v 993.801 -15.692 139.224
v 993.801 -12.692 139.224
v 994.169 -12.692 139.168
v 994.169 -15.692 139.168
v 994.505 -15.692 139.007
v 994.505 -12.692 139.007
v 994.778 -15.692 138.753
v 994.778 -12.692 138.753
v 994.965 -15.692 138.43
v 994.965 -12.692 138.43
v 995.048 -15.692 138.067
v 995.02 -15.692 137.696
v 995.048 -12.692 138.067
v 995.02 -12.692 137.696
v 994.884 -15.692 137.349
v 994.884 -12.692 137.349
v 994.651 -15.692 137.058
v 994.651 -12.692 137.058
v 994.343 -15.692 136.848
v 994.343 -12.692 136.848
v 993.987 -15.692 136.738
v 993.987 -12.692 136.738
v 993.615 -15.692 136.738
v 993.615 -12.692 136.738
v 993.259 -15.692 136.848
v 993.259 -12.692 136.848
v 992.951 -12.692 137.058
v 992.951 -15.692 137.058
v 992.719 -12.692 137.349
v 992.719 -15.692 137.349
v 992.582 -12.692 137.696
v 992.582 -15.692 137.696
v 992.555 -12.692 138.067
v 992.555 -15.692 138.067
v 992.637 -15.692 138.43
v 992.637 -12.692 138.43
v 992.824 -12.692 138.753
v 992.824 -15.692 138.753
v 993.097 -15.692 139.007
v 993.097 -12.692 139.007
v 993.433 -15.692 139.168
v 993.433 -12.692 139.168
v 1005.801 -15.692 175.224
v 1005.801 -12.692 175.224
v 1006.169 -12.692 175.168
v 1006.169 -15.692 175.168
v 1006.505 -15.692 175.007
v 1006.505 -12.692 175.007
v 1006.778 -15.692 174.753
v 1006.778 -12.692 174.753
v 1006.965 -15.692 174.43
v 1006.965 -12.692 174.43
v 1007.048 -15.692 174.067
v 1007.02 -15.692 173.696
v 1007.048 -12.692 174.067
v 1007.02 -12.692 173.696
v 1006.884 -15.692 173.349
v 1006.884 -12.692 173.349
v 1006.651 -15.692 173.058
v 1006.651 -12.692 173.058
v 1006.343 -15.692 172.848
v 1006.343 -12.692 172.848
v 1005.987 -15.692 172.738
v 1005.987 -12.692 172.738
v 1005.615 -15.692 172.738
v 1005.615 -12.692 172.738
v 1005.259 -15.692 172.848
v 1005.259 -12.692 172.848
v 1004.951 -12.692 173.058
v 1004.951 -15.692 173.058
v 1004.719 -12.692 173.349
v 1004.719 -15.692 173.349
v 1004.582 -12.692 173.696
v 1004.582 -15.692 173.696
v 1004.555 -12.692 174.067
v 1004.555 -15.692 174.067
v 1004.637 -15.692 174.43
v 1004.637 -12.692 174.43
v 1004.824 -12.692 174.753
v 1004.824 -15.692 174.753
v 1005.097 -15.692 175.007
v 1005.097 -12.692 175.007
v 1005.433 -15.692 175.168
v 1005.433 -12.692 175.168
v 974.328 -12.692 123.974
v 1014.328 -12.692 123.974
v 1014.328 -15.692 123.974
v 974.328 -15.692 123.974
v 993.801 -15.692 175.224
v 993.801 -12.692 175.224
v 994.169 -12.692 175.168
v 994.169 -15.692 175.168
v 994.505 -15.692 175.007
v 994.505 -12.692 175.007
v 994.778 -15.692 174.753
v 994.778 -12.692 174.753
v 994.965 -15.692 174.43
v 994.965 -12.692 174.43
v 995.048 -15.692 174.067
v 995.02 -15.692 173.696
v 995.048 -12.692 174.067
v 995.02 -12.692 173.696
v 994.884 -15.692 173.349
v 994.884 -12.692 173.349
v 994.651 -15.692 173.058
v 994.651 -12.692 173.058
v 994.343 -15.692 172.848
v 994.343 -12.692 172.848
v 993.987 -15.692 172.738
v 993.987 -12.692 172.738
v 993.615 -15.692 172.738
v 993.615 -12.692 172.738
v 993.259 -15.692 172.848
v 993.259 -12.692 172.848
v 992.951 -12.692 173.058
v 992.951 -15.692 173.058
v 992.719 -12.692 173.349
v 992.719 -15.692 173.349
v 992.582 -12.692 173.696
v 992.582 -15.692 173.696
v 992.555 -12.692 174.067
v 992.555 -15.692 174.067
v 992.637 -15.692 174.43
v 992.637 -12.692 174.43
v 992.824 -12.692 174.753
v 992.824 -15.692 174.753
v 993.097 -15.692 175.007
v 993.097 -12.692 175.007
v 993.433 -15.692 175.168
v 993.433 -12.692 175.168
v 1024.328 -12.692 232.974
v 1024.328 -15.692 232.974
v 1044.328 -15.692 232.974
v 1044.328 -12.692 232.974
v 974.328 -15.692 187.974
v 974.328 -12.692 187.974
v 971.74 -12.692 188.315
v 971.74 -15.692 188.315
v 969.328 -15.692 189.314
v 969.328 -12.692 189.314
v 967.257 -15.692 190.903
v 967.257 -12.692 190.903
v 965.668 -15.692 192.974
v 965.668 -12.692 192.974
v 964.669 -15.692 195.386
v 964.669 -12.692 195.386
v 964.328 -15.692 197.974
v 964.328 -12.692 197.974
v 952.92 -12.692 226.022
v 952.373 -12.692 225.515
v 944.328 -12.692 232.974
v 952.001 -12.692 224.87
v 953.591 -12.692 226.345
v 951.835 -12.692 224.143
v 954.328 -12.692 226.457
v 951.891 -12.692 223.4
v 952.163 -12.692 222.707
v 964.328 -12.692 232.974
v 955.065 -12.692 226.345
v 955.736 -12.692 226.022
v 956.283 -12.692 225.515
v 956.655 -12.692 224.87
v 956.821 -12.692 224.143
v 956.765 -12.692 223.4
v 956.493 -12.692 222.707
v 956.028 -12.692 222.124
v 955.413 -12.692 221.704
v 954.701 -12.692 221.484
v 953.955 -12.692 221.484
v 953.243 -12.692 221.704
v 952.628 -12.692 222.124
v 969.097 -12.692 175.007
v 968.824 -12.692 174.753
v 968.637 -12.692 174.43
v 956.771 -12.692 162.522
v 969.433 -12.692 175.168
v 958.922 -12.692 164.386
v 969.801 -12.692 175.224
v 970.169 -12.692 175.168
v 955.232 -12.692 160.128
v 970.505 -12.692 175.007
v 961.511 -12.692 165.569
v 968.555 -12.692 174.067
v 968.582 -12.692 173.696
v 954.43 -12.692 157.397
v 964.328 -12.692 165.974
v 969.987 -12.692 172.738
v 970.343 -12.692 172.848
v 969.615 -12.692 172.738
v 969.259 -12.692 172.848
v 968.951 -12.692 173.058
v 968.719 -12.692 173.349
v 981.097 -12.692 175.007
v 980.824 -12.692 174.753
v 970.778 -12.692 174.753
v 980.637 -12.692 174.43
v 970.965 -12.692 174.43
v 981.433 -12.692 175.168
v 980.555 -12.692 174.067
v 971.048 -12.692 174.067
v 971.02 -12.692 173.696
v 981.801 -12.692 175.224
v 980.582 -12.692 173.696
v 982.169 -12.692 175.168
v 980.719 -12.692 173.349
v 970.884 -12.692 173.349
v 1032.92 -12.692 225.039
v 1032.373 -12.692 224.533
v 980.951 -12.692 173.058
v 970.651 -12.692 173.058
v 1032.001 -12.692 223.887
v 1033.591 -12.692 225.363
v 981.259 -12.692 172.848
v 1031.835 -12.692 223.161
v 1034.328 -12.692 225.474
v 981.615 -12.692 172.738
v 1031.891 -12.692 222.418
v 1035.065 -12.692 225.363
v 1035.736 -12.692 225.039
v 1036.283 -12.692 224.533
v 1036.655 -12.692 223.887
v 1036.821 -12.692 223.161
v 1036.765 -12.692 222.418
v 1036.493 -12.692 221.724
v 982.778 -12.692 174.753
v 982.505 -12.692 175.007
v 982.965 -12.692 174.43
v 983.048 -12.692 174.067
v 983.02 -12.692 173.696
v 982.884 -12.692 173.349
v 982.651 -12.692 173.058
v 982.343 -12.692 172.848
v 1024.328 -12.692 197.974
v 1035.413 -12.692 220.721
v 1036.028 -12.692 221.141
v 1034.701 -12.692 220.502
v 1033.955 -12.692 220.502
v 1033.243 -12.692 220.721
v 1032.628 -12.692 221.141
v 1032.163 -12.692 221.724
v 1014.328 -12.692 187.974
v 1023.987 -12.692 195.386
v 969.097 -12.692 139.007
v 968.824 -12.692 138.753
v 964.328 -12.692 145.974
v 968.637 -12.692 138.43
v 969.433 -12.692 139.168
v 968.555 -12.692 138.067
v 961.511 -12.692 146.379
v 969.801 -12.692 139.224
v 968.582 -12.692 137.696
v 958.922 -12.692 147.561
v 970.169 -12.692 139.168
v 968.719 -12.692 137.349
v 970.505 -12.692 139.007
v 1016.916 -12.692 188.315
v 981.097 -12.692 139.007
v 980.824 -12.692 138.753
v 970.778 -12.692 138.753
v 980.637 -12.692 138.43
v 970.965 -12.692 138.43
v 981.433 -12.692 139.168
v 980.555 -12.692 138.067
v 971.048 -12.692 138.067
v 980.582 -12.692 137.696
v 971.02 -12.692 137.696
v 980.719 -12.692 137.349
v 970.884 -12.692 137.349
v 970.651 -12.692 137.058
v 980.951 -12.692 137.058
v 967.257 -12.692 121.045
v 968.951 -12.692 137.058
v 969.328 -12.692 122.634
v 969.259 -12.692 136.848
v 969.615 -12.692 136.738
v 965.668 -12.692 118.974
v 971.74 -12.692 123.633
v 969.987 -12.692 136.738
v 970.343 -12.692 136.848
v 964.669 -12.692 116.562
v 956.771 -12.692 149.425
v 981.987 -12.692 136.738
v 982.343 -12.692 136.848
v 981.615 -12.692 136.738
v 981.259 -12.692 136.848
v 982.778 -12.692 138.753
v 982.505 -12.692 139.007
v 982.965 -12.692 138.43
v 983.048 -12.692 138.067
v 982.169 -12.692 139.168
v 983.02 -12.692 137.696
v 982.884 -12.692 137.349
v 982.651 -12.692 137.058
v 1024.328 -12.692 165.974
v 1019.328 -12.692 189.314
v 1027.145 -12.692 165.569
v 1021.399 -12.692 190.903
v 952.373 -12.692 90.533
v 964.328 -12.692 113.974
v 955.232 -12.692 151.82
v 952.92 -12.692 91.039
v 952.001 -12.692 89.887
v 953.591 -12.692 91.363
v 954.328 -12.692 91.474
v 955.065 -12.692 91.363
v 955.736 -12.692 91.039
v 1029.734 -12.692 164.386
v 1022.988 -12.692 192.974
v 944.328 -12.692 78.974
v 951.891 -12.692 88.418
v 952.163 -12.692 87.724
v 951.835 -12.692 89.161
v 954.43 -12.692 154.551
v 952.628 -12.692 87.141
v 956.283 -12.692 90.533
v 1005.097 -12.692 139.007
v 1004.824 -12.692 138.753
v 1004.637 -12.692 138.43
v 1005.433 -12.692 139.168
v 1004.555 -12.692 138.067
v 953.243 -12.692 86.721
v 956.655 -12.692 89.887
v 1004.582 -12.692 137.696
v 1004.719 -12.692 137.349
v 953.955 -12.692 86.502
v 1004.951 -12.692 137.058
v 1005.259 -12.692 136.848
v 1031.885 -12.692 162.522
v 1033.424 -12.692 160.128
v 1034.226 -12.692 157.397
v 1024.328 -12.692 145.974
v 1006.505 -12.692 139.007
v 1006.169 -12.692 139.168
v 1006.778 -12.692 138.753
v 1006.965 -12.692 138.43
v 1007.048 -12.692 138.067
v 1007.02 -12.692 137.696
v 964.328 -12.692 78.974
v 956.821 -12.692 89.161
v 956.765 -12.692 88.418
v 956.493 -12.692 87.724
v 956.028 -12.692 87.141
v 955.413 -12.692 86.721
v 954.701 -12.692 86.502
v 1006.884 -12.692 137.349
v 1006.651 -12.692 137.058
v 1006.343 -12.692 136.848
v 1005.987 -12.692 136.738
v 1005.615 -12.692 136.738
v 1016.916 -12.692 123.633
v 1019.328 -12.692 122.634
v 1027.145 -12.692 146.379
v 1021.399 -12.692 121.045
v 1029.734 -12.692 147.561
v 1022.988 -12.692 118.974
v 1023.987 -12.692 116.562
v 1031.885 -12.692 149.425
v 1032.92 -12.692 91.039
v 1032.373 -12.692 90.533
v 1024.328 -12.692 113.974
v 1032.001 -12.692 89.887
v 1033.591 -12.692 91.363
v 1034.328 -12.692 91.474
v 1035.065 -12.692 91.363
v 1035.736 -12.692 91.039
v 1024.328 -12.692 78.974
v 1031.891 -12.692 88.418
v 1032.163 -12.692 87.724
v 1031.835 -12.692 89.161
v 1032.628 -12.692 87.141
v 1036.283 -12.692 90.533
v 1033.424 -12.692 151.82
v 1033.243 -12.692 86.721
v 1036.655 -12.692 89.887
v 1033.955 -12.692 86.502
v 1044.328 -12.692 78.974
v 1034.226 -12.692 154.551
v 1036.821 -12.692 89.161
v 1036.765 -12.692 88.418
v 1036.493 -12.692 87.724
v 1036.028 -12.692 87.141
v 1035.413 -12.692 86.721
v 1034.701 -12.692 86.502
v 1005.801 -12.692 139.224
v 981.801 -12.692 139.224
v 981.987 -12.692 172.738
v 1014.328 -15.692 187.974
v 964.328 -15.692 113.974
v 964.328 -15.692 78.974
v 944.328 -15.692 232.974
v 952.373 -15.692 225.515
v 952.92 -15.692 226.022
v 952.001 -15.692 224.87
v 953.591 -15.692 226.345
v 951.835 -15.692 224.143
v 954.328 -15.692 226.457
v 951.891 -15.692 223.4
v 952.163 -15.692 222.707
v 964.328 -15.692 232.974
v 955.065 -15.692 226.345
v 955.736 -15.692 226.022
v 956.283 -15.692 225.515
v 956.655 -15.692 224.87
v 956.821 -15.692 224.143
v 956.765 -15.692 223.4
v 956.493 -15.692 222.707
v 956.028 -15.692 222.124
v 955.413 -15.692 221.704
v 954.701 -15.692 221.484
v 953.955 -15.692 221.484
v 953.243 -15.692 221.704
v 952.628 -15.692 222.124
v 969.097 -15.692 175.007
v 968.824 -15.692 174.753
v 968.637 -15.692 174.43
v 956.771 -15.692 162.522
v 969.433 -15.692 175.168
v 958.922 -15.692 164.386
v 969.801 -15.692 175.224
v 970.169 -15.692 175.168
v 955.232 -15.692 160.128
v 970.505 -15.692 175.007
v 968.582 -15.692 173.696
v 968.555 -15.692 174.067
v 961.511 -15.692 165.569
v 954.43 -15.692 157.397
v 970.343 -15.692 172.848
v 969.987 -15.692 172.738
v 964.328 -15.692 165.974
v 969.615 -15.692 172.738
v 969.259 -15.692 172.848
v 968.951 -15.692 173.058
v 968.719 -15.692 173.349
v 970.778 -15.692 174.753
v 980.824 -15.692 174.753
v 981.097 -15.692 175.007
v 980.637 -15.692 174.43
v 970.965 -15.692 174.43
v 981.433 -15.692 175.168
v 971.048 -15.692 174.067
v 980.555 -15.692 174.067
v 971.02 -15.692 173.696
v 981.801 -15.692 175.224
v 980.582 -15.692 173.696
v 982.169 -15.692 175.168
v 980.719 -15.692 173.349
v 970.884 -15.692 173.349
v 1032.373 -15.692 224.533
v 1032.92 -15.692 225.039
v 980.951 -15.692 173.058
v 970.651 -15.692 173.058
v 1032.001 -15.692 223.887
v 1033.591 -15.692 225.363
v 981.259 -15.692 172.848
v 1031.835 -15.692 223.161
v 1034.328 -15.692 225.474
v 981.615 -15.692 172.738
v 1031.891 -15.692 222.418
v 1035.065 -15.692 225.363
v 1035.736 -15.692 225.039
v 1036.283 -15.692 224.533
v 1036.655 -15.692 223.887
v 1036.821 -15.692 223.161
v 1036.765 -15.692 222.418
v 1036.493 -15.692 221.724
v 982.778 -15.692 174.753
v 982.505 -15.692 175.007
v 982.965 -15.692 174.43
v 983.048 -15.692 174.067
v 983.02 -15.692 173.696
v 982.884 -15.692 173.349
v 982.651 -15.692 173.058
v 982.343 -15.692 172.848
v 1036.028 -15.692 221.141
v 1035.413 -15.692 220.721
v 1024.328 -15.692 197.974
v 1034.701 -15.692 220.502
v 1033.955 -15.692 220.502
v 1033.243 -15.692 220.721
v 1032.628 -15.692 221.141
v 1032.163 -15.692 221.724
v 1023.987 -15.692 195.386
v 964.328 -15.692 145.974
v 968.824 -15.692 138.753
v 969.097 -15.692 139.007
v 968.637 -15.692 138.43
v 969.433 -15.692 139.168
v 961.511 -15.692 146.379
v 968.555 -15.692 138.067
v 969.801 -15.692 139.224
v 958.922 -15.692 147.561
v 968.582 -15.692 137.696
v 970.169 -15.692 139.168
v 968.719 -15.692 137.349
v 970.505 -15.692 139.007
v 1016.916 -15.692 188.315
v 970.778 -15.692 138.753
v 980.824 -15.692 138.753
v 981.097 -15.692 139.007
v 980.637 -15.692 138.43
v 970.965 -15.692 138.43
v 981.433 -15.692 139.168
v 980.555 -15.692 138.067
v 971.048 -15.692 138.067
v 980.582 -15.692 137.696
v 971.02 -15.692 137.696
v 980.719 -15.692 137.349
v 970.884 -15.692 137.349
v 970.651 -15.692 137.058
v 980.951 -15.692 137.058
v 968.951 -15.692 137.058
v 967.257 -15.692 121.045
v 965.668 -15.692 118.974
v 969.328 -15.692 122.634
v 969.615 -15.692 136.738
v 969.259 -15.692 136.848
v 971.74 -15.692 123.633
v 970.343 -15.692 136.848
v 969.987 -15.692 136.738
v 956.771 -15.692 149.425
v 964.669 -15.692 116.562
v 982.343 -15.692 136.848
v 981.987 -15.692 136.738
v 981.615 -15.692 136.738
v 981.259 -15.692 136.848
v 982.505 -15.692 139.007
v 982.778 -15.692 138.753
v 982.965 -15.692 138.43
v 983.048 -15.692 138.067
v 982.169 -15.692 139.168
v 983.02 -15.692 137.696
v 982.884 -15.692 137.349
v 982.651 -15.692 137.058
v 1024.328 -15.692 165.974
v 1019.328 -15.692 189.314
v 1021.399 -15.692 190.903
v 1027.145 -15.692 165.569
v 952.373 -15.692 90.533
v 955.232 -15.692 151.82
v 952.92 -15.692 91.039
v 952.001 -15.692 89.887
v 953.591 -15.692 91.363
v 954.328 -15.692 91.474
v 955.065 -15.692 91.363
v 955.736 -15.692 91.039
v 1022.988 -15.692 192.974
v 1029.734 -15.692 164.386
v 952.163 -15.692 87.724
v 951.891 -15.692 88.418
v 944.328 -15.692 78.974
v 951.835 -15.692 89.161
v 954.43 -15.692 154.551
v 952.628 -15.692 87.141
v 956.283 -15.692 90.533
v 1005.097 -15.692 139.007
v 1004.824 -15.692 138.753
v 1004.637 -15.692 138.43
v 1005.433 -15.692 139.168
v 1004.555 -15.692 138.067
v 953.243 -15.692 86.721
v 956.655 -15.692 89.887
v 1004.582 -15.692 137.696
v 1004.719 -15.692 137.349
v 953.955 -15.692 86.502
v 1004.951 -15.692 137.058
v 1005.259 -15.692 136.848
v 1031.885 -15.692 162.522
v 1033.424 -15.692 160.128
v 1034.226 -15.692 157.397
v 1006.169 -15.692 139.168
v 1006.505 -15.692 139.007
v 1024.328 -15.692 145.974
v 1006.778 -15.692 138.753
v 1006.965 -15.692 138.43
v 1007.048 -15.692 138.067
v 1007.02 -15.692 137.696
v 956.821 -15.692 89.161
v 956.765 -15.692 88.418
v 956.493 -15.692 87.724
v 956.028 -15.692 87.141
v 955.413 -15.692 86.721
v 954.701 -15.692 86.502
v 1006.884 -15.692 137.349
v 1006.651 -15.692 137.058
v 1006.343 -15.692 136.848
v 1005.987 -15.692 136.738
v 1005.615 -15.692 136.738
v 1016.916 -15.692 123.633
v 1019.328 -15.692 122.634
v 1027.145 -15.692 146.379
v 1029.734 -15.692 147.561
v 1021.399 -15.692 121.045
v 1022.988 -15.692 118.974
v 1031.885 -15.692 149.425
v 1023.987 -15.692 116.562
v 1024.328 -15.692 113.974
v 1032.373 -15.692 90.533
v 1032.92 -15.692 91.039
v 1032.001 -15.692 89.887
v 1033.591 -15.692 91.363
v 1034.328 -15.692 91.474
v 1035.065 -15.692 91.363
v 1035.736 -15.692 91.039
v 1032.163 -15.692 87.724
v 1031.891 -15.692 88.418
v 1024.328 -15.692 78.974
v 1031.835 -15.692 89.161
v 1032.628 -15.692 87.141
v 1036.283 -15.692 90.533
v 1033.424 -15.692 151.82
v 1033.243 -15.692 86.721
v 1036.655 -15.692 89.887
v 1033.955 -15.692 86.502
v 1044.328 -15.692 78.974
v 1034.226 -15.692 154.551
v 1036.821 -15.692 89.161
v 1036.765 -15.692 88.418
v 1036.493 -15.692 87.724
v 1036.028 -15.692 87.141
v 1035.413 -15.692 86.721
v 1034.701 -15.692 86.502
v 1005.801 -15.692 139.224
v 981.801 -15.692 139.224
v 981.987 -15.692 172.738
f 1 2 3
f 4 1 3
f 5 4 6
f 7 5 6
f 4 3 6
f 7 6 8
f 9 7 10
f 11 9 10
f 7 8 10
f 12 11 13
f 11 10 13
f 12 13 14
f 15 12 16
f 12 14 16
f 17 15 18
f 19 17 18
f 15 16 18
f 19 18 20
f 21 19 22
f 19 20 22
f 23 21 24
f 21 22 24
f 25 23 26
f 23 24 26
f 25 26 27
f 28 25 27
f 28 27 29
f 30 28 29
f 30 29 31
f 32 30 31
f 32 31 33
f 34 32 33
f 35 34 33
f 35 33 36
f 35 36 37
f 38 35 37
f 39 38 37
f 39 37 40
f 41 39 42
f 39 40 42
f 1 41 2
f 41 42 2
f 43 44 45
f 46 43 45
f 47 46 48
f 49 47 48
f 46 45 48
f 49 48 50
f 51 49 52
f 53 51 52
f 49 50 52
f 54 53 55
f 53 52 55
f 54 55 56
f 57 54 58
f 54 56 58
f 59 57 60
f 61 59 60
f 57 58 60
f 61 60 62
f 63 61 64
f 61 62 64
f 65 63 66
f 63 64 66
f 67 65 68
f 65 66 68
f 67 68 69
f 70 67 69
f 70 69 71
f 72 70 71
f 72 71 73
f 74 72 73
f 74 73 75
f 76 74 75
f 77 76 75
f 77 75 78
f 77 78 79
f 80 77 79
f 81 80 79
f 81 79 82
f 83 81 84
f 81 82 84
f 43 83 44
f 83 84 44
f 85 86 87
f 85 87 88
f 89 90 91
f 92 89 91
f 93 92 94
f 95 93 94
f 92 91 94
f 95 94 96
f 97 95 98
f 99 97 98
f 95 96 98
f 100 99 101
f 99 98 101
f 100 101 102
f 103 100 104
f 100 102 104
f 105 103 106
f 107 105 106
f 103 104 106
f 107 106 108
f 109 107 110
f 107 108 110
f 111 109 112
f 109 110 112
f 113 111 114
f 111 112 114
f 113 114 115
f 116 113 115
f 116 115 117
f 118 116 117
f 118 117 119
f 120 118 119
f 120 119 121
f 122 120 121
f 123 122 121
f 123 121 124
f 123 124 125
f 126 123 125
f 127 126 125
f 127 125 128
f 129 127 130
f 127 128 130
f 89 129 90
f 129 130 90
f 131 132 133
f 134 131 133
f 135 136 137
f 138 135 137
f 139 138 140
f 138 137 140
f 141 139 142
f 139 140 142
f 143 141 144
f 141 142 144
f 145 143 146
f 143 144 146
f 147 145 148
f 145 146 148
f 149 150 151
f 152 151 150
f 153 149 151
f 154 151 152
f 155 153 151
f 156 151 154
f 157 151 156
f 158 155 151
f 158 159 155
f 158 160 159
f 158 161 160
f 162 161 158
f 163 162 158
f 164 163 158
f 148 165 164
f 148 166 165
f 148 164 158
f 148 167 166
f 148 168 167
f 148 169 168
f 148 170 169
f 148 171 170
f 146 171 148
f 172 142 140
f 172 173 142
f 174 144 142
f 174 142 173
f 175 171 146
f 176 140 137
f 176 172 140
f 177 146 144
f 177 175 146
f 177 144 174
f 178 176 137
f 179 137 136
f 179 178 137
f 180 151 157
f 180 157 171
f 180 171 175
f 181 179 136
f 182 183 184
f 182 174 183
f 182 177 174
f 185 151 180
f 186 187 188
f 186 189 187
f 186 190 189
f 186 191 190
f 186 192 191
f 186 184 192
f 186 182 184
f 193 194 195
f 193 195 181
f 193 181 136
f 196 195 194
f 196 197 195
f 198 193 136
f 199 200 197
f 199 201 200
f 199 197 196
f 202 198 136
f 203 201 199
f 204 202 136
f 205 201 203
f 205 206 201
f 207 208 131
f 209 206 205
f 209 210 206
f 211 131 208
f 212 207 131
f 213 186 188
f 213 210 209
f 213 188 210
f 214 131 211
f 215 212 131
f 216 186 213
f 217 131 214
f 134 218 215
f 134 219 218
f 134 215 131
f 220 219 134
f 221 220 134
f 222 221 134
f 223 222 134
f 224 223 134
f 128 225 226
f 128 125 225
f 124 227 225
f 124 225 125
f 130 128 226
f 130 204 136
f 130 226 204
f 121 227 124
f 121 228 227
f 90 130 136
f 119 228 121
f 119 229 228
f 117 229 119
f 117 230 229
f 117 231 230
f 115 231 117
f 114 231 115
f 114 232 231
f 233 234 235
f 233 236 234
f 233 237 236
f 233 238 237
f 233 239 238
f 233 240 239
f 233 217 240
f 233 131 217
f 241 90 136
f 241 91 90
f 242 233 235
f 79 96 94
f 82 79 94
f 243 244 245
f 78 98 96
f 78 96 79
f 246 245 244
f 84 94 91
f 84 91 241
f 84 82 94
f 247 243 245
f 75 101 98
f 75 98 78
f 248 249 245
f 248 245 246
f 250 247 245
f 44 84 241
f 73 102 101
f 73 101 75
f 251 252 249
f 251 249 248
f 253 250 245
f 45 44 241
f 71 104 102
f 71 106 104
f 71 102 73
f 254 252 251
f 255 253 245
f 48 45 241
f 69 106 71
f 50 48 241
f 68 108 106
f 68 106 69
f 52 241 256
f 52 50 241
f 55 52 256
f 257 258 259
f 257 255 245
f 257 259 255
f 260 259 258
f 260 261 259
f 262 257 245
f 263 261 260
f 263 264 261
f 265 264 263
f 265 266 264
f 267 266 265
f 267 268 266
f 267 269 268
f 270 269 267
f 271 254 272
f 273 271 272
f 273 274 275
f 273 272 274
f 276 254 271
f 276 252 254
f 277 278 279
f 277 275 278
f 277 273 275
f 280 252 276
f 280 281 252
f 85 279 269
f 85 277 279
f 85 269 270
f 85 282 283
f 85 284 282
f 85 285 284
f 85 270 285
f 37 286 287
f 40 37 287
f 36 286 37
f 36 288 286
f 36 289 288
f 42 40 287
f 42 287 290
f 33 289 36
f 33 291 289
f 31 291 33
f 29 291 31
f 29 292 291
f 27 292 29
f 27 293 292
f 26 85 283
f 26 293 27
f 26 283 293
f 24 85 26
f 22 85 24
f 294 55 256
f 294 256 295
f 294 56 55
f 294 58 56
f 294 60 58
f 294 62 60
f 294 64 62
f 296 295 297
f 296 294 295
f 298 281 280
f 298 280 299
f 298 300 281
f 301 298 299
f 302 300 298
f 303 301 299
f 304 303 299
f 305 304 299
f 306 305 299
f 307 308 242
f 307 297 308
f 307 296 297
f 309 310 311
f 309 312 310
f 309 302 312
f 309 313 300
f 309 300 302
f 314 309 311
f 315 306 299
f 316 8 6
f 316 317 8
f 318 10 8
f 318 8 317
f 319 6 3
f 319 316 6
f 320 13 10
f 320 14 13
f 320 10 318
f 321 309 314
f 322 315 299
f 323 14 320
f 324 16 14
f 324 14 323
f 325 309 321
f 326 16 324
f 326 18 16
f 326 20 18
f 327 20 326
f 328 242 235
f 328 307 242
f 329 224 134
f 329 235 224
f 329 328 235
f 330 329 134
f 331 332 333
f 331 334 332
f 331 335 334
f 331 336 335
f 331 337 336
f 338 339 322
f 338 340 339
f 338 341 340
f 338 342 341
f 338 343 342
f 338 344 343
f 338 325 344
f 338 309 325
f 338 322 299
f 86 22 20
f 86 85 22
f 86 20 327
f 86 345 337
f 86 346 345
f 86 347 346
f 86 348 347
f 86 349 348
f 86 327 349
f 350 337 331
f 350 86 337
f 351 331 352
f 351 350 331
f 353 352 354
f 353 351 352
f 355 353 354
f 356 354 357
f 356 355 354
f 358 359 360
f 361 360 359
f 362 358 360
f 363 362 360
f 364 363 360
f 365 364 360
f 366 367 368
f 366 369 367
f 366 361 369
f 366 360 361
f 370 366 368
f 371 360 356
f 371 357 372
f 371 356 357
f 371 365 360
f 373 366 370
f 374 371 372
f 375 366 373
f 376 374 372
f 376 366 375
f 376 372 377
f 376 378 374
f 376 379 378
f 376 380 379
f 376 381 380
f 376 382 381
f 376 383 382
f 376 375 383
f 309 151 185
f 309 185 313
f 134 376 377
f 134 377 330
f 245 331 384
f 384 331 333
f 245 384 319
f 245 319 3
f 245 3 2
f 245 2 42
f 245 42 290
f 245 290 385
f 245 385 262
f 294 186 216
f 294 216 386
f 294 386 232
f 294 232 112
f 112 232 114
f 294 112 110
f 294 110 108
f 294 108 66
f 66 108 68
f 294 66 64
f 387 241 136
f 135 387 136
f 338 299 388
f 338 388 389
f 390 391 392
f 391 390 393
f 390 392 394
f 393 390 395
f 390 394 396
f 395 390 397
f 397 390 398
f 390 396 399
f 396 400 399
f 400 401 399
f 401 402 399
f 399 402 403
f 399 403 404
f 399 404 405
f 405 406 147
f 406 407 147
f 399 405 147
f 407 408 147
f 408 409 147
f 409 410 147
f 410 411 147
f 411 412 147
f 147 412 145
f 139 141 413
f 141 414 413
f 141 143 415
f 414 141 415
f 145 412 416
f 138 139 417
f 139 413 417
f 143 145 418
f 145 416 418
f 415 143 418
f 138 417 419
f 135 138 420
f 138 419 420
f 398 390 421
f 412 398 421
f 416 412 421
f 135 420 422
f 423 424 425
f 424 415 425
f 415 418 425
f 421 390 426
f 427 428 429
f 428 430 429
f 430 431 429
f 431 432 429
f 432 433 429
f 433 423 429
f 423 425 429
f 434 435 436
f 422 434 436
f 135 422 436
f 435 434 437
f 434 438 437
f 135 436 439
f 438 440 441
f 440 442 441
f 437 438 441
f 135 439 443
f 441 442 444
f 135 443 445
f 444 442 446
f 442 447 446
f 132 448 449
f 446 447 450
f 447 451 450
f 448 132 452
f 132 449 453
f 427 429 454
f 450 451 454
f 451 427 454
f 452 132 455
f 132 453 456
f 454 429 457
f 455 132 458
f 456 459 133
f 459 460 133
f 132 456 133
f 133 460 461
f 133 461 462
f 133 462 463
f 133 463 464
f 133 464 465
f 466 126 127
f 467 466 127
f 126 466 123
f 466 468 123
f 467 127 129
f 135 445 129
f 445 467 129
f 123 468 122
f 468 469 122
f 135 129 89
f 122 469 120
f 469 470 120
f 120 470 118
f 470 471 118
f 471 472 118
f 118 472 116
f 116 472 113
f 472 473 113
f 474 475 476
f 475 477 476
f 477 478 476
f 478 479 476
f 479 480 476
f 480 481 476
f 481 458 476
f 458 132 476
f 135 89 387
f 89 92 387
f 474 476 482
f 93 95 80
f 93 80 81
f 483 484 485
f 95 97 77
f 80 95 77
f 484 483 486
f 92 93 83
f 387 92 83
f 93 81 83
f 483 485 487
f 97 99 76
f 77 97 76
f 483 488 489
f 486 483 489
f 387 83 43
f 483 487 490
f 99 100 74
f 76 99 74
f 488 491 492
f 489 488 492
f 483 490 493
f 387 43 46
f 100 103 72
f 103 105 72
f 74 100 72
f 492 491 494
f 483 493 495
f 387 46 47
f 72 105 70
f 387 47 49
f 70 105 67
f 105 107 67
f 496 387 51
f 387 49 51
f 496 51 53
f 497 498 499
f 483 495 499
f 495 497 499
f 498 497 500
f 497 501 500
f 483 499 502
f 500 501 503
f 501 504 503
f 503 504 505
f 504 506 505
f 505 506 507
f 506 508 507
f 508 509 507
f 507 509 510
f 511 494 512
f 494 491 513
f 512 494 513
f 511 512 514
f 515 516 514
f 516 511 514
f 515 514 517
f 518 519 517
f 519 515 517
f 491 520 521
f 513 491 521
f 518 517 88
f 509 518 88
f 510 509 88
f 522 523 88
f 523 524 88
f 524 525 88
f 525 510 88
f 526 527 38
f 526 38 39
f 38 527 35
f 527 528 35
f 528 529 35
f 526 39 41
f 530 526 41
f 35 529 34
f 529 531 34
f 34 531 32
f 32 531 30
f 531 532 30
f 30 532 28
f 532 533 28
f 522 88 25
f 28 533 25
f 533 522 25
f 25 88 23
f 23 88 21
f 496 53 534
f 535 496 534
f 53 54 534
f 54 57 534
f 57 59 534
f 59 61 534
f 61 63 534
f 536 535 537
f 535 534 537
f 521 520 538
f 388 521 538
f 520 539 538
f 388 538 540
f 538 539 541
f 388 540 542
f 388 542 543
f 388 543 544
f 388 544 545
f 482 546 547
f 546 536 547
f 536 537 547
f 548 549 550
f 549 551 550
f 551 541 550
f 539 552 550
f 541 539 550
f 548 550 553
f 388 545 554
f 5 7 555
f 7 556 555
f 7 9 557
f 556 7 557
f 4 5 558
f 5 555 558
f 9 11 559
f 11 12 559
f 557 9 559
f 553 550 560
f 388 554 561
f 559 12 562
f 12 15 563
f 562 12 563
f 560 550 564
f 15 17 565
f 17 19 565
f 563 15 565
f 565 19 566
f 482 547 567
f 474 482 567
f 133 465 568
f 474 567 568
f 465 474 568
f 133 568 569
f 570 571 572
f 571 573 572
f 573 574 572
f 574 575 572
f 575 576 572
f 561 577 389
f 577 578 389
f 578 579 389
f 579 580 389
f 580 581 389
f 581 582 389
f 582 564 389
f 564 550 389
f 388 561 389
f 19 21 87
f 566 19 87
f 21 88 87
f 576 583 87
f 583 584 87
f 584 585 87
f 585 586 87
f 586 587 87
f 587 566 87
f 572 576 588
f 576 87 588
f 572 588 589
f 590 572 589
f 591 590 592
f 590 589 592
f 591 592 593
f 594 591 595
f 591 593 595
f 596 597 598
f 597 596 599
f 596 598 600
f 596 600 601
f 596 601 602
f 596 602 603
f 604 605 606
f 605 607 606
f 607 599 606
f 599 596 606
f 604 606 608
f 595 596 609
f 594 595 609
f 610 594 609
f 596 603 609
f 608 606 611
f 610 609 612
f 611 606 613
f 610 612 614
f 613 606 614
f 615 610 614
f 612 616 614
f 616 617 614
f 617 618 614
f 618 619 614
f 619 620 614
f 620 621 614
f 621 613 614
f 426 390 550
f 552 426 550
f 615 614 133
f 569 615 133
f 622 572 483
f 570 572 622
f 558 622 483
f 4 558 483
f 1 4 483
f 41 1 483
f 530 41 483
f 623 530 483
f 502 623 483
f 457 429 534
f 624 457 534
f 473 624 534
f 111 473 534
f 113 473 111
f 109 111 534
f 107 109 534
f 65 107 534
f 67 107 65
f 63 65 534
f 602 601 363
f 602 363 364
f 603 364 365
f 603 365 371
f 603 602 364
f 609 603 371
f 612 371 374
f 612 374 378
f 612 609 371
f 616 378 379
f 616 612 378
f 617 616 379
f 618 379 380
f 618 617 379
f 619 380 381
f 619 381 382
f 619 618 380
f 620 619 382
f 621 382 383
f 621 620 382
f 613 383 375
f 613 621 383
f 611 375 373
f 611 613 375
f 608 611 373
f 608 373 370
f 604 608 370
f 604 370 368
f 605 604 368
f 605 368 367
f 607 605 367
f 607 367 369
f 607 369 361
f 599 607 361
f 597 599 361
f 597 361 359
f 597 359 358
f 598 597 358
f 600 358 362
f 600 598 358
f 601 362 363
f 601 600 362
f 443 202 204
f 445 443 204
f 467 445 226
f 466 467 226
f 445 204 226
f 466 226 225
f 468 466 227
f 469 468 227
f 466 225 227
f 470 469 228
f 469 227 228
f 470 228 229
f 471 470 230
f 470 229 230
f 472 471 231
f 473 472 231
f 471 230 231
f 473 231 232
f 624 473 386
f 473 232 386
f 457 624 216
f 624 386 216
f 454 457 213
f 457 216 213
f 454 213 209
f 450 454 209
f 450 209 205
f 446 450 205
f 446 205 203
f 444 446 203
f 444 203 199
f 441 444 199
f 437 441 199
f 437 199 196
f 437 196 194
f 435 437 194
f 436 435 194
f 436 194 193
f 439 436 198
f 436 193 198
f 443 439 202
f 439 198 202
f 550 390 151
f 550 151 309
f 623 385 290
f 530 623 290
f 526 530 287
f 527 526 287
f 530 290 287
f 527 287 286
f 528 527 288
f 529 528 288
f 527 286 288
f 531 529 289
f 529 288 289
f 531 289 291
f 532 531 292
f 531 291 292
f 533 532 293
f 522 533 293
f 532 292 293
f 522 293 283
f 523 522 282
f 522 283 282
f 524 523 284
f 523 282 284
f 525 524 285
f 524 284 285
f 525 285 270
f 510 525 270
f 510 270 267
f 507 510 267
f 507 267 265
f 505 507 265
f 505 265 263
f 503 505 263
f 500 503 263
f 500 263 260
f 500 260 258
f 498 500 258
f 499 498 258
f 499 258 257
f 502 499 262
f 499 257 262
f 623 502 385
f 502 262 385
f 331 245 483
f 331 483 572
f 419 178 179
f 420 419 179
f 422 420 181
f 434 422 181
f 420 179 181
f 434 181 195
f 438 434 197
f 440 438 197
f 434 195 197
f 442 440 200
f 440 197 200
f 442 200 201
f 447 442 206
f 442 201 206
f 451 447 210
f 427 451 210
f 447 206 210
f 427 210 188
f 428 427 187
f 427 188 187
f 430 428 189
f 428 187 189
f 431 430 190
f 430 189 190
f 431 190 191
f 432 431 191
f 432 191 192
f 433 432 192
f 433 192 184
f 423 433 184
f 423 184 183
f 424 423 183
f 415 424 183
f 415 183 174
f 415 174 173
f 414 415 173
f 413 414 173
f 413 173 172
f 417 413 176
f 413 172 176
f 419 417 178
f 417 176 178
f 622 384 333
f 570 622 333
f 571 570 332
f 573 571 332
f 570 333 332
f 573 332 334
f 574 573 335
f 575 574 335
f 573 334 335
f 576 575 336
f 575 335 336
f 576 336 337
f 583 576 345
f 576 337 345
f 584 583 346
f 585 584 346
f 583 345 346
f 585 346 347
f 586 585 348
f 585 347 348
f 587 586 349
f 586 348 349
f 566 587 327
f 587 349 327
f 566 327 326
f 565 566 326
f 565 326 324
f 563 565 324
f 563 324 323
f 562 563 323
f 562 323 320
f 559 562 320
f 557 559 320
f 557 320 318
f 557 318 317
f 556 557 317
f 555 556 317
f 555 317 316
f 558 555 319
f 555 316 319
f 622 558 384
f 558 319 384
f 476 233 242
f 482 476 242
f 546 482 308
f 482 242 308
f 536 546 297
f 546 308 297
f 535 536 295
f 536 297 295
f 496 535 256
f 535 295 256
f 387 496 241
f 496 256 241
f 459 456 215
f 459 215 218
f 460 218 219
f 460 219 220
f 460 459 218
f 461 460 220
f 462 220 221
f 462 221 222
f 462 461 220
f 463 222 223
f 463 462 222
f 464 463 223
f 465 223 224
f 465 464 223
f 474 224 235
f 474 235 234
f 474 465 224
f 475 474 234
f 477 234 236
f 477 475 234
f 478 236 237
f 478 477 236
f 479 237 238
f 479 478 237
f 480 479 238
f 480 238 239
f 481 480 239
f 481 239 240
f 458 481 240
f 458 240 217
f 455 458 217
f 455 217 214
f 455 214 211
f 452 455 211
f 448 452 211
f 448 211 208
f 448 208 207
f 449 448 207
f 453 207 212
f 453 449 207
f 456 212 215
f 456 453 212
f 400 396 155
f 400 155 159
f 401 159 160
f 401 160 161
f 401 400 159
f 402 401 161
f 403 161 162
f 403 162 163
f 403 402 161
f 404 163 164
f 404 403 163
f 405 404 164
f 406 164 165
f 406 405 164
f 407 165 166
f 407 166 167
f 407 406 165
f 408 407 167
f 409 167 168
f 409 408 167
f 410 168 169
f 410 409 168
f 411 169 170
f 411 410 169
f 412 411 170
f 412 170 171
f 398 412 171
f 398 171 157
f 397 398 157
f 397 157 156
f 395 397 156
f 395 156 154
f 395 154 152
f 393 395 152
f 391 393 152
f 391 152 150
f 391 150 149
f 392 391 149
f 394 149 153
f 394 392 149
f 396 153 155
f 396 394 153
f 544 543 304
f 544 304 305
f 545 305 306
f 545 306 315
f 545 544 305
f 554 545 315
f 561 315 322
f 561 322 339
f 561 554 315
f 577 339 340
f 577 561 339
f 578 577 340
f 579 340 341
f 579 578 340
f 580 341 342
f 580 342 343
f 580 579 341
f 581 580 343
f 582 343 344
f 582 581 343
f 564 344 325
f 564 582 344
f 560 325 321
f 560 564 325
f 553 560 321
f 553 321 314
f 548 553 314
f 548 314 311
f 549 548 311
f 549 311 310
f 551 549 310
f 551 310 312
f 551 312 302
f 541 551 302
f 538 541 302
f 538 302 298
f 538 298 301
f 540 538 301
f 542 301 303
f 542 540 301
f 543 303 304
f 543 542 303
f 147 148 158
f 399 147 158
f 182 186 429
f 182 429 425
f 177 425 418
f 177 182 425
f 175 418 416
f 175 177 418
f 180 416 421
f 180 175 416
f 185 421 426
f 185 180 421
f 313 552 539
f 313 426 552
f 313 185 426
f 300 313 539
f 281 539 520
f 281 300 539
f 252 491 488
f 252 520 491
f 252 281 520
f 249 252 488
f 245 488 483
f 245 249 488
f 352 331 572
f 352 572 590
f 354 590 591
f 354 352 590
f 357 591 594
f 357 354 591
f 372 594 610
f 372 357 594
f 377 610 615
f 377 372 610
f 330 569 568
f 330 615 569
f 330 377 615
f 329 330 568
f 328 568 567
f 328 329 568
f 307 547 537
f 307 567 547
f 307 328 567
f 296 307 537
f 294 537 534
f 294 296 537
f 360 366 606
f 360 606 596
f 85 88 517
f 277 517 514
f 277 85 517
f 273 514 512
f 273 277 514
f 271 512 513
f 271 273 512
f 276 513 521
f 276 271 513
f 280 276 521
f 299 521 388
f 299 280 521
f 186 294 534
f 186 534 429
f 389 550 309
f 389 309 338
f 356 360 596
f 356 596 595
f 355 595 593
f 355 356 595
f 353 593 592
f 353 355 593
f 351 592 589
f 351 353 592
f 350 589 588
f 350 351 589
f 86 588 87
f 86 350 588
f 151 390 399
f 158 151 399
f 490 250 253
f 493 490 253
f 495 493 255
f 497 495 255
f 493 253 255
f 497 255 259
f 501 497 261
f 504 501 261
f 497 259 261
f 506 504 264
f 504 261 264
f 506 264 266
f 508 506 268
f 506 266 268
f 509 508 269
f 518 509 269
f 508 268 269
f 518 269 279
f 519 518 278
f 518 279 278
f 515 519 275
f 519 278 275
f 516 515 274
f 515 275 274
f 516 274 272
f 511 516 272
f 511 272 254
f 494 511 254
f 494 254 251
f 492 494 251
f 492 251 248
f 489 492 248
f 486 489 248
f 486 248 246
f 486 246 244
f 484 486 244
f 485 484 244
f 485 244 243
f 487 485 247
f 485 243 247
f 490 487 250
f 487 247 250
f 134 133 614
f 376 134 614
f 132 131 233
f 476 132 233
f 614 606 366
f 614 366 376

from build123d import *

# Parameters (mm, degrees)
SKETCH_1_W          = 100
SKETCH_1_H          = 154
SKETCH_1_R          = 2.5
EXTRUDE_1_DEPTH     = 3
SKETCH_4_R          = 1.25
CUT_EXTRUDE_1_DEPTH = 3
CUT_EXTRUDE_2_DEPTH = 10
CUT_EXTRUDE_3_DEPTH = 10


with BuildPart() as part:
    # 스케치1 → 보스-돌출1 (new body)
    with BuildSketch(Plane(origin=(0, -15.691888839, 0), x_dir=(1, 0, 0), z_dir=(0, 1, 0))):
        with Locations((994.328, -155.973817188)):
            Rectangle(SKETCH_1_W, SKETCH_1_H)
        with Locations(Location((1034.328, -88.973817188, 0), (0, 0, 270))):
            Circle(SKETCH_1_R, mode=Mode.SUBTRACT)
        with Locations(Location((1034.328, -222.973817188, 0), (0, 0, 270))):
            Circle(SKETCH_1_R, mode=Mode.SUBTRACT)
        with Locations(Location((954.328, -223.956502664, 0), (0, 0, 270))):
            Circle(SKETCH_1_R, mode=Mode.SUBTRACT)
        with Locations(Location((954.328, -88.973817188, 0), (0, 0, 270))):
            Circle(SKETCH_1_R, mode=Mode.SUBTRACT)
    extrude(amount=EXTRUDE_1_DEPTH)

    # 스케치4 → 컷-돌출1 (cut)
    with BuildSketch(Plane(origin=(0, -12.691888839, 0), x_dir=(1, 0, 0), z_dir=(0, 1, 0))):
        with Locations(Location((969.801034838, -137.973817188, 0), (0, 0, 270))):
            Circle(SKETCH_4_R)
        with Locations(Location((1005.801034838, -137.973817188, 0), (0, 0, 270))):
            Circle(SKETCH_4_R)
        with Locations(Location((1005.801034838, -173.973817188, 0), (0, 0, 270))):
            Circle(SKETCH_4_R)
        with Locations(Location((969.801034838, -173.973817188, 0), (0, 0, 270))):
            Circle(SKETCH_4_R)
        with Locations(Location((993.801034838, -137.973817188, 0), (0, 0, 270))):
            Circle(SKETCH_4_R)
        with Locations(Location((981.801034838, -137.973817188, 0), (0, 0, 270))):
            Circle(SKETCH_4_R)
        with Locations(Location((981.801034838, -173.973817188, 0), (0, 0, 270))):
            Circle(SKETCH_4_R)
        with Locations(Location((993.801034838, -173.973817188, 0), (0, 0, 270))):
            Circle(SKETCH_4_R)
    extrude(amount=-CUT_EXTRUDE_1_DEPTH, mode=Mode.SUBTRACT)

    # 스케치5 → 컷-돌출2 (cut)
    with BuildSketch(Plane(origin=(0, -12.691888839, 0), x_dir=(1, 0, 0), z_dir=(0, 1, 0))):
        with BuildLine():
            Line((964.328, -78.875628165), (1024.328, -78.875628165))
            Line((1024.328, -78.875628165), (1024.328, -113.973817188))
            ThreePointArc((1024.328, -113.973817188), (1021.399067812, -121.044884999), (1014.328, -123.973817188))
            Line((1014.328, -123.973817188), (974.328, -123.973817188))
            ThreePointArc((974.328, -123.973817188), (967.256932188, -121.044884999), (964.328, -113.973817188))
            Line((964.328, -113.973817188), (964.328, -78.875628165))
        make_face()
        with BuildLine():
            Line((964.328, -238.398898185), (1024.328, -238.398898185))
            Line((1024.328, -238.398898185), (1024.328, -197.973817188))
            ThreePointArc((1024.328, -197.973817188), (1021.399067812, -190.902749376), (1014.328, -187.973817188))
            Line((1014.328, -187.973817188), (974.328, -187.973817188))
            ThreePointArc((974.328, -187.973817188), (967.256932188, -190.902749376), (964.328, -197.973817188))
            Line((964.328, -197.973817188), (964.328, -238.398898185))
        make_face()
    extrude(amount=-CUT_EXTRUDE_2_DEPTH, mode=Mode.SUBTRACT)

    # 스케치6 → 컷-돌출3 (cut)
    with BuildSketch(Plane(origin=(0, -12.691888839, 0), x_dir=(1, 0, 0), z_dir=(0, 1, 0))):
        with BuildLine():
            Line((964.328, -145.973817188), (1024.328, -145.973817188))
            ThreePointArc((1024.328, -145.973817188), (1034.328, -155.973817188), (1024.328, -165.973817188))
            Line((1024.328, -165.973817188), (964.328, -165.973817188))
            ThreePointArc((964.328, -165.973817188), (954.328, -155.973817188), (964.328, -145.973817188))
        make_face()
    extrude(amount=-CUT_EXTRUDE_3_DEPTH, mode=Mode.SUBTRACT)


solid = part.part
